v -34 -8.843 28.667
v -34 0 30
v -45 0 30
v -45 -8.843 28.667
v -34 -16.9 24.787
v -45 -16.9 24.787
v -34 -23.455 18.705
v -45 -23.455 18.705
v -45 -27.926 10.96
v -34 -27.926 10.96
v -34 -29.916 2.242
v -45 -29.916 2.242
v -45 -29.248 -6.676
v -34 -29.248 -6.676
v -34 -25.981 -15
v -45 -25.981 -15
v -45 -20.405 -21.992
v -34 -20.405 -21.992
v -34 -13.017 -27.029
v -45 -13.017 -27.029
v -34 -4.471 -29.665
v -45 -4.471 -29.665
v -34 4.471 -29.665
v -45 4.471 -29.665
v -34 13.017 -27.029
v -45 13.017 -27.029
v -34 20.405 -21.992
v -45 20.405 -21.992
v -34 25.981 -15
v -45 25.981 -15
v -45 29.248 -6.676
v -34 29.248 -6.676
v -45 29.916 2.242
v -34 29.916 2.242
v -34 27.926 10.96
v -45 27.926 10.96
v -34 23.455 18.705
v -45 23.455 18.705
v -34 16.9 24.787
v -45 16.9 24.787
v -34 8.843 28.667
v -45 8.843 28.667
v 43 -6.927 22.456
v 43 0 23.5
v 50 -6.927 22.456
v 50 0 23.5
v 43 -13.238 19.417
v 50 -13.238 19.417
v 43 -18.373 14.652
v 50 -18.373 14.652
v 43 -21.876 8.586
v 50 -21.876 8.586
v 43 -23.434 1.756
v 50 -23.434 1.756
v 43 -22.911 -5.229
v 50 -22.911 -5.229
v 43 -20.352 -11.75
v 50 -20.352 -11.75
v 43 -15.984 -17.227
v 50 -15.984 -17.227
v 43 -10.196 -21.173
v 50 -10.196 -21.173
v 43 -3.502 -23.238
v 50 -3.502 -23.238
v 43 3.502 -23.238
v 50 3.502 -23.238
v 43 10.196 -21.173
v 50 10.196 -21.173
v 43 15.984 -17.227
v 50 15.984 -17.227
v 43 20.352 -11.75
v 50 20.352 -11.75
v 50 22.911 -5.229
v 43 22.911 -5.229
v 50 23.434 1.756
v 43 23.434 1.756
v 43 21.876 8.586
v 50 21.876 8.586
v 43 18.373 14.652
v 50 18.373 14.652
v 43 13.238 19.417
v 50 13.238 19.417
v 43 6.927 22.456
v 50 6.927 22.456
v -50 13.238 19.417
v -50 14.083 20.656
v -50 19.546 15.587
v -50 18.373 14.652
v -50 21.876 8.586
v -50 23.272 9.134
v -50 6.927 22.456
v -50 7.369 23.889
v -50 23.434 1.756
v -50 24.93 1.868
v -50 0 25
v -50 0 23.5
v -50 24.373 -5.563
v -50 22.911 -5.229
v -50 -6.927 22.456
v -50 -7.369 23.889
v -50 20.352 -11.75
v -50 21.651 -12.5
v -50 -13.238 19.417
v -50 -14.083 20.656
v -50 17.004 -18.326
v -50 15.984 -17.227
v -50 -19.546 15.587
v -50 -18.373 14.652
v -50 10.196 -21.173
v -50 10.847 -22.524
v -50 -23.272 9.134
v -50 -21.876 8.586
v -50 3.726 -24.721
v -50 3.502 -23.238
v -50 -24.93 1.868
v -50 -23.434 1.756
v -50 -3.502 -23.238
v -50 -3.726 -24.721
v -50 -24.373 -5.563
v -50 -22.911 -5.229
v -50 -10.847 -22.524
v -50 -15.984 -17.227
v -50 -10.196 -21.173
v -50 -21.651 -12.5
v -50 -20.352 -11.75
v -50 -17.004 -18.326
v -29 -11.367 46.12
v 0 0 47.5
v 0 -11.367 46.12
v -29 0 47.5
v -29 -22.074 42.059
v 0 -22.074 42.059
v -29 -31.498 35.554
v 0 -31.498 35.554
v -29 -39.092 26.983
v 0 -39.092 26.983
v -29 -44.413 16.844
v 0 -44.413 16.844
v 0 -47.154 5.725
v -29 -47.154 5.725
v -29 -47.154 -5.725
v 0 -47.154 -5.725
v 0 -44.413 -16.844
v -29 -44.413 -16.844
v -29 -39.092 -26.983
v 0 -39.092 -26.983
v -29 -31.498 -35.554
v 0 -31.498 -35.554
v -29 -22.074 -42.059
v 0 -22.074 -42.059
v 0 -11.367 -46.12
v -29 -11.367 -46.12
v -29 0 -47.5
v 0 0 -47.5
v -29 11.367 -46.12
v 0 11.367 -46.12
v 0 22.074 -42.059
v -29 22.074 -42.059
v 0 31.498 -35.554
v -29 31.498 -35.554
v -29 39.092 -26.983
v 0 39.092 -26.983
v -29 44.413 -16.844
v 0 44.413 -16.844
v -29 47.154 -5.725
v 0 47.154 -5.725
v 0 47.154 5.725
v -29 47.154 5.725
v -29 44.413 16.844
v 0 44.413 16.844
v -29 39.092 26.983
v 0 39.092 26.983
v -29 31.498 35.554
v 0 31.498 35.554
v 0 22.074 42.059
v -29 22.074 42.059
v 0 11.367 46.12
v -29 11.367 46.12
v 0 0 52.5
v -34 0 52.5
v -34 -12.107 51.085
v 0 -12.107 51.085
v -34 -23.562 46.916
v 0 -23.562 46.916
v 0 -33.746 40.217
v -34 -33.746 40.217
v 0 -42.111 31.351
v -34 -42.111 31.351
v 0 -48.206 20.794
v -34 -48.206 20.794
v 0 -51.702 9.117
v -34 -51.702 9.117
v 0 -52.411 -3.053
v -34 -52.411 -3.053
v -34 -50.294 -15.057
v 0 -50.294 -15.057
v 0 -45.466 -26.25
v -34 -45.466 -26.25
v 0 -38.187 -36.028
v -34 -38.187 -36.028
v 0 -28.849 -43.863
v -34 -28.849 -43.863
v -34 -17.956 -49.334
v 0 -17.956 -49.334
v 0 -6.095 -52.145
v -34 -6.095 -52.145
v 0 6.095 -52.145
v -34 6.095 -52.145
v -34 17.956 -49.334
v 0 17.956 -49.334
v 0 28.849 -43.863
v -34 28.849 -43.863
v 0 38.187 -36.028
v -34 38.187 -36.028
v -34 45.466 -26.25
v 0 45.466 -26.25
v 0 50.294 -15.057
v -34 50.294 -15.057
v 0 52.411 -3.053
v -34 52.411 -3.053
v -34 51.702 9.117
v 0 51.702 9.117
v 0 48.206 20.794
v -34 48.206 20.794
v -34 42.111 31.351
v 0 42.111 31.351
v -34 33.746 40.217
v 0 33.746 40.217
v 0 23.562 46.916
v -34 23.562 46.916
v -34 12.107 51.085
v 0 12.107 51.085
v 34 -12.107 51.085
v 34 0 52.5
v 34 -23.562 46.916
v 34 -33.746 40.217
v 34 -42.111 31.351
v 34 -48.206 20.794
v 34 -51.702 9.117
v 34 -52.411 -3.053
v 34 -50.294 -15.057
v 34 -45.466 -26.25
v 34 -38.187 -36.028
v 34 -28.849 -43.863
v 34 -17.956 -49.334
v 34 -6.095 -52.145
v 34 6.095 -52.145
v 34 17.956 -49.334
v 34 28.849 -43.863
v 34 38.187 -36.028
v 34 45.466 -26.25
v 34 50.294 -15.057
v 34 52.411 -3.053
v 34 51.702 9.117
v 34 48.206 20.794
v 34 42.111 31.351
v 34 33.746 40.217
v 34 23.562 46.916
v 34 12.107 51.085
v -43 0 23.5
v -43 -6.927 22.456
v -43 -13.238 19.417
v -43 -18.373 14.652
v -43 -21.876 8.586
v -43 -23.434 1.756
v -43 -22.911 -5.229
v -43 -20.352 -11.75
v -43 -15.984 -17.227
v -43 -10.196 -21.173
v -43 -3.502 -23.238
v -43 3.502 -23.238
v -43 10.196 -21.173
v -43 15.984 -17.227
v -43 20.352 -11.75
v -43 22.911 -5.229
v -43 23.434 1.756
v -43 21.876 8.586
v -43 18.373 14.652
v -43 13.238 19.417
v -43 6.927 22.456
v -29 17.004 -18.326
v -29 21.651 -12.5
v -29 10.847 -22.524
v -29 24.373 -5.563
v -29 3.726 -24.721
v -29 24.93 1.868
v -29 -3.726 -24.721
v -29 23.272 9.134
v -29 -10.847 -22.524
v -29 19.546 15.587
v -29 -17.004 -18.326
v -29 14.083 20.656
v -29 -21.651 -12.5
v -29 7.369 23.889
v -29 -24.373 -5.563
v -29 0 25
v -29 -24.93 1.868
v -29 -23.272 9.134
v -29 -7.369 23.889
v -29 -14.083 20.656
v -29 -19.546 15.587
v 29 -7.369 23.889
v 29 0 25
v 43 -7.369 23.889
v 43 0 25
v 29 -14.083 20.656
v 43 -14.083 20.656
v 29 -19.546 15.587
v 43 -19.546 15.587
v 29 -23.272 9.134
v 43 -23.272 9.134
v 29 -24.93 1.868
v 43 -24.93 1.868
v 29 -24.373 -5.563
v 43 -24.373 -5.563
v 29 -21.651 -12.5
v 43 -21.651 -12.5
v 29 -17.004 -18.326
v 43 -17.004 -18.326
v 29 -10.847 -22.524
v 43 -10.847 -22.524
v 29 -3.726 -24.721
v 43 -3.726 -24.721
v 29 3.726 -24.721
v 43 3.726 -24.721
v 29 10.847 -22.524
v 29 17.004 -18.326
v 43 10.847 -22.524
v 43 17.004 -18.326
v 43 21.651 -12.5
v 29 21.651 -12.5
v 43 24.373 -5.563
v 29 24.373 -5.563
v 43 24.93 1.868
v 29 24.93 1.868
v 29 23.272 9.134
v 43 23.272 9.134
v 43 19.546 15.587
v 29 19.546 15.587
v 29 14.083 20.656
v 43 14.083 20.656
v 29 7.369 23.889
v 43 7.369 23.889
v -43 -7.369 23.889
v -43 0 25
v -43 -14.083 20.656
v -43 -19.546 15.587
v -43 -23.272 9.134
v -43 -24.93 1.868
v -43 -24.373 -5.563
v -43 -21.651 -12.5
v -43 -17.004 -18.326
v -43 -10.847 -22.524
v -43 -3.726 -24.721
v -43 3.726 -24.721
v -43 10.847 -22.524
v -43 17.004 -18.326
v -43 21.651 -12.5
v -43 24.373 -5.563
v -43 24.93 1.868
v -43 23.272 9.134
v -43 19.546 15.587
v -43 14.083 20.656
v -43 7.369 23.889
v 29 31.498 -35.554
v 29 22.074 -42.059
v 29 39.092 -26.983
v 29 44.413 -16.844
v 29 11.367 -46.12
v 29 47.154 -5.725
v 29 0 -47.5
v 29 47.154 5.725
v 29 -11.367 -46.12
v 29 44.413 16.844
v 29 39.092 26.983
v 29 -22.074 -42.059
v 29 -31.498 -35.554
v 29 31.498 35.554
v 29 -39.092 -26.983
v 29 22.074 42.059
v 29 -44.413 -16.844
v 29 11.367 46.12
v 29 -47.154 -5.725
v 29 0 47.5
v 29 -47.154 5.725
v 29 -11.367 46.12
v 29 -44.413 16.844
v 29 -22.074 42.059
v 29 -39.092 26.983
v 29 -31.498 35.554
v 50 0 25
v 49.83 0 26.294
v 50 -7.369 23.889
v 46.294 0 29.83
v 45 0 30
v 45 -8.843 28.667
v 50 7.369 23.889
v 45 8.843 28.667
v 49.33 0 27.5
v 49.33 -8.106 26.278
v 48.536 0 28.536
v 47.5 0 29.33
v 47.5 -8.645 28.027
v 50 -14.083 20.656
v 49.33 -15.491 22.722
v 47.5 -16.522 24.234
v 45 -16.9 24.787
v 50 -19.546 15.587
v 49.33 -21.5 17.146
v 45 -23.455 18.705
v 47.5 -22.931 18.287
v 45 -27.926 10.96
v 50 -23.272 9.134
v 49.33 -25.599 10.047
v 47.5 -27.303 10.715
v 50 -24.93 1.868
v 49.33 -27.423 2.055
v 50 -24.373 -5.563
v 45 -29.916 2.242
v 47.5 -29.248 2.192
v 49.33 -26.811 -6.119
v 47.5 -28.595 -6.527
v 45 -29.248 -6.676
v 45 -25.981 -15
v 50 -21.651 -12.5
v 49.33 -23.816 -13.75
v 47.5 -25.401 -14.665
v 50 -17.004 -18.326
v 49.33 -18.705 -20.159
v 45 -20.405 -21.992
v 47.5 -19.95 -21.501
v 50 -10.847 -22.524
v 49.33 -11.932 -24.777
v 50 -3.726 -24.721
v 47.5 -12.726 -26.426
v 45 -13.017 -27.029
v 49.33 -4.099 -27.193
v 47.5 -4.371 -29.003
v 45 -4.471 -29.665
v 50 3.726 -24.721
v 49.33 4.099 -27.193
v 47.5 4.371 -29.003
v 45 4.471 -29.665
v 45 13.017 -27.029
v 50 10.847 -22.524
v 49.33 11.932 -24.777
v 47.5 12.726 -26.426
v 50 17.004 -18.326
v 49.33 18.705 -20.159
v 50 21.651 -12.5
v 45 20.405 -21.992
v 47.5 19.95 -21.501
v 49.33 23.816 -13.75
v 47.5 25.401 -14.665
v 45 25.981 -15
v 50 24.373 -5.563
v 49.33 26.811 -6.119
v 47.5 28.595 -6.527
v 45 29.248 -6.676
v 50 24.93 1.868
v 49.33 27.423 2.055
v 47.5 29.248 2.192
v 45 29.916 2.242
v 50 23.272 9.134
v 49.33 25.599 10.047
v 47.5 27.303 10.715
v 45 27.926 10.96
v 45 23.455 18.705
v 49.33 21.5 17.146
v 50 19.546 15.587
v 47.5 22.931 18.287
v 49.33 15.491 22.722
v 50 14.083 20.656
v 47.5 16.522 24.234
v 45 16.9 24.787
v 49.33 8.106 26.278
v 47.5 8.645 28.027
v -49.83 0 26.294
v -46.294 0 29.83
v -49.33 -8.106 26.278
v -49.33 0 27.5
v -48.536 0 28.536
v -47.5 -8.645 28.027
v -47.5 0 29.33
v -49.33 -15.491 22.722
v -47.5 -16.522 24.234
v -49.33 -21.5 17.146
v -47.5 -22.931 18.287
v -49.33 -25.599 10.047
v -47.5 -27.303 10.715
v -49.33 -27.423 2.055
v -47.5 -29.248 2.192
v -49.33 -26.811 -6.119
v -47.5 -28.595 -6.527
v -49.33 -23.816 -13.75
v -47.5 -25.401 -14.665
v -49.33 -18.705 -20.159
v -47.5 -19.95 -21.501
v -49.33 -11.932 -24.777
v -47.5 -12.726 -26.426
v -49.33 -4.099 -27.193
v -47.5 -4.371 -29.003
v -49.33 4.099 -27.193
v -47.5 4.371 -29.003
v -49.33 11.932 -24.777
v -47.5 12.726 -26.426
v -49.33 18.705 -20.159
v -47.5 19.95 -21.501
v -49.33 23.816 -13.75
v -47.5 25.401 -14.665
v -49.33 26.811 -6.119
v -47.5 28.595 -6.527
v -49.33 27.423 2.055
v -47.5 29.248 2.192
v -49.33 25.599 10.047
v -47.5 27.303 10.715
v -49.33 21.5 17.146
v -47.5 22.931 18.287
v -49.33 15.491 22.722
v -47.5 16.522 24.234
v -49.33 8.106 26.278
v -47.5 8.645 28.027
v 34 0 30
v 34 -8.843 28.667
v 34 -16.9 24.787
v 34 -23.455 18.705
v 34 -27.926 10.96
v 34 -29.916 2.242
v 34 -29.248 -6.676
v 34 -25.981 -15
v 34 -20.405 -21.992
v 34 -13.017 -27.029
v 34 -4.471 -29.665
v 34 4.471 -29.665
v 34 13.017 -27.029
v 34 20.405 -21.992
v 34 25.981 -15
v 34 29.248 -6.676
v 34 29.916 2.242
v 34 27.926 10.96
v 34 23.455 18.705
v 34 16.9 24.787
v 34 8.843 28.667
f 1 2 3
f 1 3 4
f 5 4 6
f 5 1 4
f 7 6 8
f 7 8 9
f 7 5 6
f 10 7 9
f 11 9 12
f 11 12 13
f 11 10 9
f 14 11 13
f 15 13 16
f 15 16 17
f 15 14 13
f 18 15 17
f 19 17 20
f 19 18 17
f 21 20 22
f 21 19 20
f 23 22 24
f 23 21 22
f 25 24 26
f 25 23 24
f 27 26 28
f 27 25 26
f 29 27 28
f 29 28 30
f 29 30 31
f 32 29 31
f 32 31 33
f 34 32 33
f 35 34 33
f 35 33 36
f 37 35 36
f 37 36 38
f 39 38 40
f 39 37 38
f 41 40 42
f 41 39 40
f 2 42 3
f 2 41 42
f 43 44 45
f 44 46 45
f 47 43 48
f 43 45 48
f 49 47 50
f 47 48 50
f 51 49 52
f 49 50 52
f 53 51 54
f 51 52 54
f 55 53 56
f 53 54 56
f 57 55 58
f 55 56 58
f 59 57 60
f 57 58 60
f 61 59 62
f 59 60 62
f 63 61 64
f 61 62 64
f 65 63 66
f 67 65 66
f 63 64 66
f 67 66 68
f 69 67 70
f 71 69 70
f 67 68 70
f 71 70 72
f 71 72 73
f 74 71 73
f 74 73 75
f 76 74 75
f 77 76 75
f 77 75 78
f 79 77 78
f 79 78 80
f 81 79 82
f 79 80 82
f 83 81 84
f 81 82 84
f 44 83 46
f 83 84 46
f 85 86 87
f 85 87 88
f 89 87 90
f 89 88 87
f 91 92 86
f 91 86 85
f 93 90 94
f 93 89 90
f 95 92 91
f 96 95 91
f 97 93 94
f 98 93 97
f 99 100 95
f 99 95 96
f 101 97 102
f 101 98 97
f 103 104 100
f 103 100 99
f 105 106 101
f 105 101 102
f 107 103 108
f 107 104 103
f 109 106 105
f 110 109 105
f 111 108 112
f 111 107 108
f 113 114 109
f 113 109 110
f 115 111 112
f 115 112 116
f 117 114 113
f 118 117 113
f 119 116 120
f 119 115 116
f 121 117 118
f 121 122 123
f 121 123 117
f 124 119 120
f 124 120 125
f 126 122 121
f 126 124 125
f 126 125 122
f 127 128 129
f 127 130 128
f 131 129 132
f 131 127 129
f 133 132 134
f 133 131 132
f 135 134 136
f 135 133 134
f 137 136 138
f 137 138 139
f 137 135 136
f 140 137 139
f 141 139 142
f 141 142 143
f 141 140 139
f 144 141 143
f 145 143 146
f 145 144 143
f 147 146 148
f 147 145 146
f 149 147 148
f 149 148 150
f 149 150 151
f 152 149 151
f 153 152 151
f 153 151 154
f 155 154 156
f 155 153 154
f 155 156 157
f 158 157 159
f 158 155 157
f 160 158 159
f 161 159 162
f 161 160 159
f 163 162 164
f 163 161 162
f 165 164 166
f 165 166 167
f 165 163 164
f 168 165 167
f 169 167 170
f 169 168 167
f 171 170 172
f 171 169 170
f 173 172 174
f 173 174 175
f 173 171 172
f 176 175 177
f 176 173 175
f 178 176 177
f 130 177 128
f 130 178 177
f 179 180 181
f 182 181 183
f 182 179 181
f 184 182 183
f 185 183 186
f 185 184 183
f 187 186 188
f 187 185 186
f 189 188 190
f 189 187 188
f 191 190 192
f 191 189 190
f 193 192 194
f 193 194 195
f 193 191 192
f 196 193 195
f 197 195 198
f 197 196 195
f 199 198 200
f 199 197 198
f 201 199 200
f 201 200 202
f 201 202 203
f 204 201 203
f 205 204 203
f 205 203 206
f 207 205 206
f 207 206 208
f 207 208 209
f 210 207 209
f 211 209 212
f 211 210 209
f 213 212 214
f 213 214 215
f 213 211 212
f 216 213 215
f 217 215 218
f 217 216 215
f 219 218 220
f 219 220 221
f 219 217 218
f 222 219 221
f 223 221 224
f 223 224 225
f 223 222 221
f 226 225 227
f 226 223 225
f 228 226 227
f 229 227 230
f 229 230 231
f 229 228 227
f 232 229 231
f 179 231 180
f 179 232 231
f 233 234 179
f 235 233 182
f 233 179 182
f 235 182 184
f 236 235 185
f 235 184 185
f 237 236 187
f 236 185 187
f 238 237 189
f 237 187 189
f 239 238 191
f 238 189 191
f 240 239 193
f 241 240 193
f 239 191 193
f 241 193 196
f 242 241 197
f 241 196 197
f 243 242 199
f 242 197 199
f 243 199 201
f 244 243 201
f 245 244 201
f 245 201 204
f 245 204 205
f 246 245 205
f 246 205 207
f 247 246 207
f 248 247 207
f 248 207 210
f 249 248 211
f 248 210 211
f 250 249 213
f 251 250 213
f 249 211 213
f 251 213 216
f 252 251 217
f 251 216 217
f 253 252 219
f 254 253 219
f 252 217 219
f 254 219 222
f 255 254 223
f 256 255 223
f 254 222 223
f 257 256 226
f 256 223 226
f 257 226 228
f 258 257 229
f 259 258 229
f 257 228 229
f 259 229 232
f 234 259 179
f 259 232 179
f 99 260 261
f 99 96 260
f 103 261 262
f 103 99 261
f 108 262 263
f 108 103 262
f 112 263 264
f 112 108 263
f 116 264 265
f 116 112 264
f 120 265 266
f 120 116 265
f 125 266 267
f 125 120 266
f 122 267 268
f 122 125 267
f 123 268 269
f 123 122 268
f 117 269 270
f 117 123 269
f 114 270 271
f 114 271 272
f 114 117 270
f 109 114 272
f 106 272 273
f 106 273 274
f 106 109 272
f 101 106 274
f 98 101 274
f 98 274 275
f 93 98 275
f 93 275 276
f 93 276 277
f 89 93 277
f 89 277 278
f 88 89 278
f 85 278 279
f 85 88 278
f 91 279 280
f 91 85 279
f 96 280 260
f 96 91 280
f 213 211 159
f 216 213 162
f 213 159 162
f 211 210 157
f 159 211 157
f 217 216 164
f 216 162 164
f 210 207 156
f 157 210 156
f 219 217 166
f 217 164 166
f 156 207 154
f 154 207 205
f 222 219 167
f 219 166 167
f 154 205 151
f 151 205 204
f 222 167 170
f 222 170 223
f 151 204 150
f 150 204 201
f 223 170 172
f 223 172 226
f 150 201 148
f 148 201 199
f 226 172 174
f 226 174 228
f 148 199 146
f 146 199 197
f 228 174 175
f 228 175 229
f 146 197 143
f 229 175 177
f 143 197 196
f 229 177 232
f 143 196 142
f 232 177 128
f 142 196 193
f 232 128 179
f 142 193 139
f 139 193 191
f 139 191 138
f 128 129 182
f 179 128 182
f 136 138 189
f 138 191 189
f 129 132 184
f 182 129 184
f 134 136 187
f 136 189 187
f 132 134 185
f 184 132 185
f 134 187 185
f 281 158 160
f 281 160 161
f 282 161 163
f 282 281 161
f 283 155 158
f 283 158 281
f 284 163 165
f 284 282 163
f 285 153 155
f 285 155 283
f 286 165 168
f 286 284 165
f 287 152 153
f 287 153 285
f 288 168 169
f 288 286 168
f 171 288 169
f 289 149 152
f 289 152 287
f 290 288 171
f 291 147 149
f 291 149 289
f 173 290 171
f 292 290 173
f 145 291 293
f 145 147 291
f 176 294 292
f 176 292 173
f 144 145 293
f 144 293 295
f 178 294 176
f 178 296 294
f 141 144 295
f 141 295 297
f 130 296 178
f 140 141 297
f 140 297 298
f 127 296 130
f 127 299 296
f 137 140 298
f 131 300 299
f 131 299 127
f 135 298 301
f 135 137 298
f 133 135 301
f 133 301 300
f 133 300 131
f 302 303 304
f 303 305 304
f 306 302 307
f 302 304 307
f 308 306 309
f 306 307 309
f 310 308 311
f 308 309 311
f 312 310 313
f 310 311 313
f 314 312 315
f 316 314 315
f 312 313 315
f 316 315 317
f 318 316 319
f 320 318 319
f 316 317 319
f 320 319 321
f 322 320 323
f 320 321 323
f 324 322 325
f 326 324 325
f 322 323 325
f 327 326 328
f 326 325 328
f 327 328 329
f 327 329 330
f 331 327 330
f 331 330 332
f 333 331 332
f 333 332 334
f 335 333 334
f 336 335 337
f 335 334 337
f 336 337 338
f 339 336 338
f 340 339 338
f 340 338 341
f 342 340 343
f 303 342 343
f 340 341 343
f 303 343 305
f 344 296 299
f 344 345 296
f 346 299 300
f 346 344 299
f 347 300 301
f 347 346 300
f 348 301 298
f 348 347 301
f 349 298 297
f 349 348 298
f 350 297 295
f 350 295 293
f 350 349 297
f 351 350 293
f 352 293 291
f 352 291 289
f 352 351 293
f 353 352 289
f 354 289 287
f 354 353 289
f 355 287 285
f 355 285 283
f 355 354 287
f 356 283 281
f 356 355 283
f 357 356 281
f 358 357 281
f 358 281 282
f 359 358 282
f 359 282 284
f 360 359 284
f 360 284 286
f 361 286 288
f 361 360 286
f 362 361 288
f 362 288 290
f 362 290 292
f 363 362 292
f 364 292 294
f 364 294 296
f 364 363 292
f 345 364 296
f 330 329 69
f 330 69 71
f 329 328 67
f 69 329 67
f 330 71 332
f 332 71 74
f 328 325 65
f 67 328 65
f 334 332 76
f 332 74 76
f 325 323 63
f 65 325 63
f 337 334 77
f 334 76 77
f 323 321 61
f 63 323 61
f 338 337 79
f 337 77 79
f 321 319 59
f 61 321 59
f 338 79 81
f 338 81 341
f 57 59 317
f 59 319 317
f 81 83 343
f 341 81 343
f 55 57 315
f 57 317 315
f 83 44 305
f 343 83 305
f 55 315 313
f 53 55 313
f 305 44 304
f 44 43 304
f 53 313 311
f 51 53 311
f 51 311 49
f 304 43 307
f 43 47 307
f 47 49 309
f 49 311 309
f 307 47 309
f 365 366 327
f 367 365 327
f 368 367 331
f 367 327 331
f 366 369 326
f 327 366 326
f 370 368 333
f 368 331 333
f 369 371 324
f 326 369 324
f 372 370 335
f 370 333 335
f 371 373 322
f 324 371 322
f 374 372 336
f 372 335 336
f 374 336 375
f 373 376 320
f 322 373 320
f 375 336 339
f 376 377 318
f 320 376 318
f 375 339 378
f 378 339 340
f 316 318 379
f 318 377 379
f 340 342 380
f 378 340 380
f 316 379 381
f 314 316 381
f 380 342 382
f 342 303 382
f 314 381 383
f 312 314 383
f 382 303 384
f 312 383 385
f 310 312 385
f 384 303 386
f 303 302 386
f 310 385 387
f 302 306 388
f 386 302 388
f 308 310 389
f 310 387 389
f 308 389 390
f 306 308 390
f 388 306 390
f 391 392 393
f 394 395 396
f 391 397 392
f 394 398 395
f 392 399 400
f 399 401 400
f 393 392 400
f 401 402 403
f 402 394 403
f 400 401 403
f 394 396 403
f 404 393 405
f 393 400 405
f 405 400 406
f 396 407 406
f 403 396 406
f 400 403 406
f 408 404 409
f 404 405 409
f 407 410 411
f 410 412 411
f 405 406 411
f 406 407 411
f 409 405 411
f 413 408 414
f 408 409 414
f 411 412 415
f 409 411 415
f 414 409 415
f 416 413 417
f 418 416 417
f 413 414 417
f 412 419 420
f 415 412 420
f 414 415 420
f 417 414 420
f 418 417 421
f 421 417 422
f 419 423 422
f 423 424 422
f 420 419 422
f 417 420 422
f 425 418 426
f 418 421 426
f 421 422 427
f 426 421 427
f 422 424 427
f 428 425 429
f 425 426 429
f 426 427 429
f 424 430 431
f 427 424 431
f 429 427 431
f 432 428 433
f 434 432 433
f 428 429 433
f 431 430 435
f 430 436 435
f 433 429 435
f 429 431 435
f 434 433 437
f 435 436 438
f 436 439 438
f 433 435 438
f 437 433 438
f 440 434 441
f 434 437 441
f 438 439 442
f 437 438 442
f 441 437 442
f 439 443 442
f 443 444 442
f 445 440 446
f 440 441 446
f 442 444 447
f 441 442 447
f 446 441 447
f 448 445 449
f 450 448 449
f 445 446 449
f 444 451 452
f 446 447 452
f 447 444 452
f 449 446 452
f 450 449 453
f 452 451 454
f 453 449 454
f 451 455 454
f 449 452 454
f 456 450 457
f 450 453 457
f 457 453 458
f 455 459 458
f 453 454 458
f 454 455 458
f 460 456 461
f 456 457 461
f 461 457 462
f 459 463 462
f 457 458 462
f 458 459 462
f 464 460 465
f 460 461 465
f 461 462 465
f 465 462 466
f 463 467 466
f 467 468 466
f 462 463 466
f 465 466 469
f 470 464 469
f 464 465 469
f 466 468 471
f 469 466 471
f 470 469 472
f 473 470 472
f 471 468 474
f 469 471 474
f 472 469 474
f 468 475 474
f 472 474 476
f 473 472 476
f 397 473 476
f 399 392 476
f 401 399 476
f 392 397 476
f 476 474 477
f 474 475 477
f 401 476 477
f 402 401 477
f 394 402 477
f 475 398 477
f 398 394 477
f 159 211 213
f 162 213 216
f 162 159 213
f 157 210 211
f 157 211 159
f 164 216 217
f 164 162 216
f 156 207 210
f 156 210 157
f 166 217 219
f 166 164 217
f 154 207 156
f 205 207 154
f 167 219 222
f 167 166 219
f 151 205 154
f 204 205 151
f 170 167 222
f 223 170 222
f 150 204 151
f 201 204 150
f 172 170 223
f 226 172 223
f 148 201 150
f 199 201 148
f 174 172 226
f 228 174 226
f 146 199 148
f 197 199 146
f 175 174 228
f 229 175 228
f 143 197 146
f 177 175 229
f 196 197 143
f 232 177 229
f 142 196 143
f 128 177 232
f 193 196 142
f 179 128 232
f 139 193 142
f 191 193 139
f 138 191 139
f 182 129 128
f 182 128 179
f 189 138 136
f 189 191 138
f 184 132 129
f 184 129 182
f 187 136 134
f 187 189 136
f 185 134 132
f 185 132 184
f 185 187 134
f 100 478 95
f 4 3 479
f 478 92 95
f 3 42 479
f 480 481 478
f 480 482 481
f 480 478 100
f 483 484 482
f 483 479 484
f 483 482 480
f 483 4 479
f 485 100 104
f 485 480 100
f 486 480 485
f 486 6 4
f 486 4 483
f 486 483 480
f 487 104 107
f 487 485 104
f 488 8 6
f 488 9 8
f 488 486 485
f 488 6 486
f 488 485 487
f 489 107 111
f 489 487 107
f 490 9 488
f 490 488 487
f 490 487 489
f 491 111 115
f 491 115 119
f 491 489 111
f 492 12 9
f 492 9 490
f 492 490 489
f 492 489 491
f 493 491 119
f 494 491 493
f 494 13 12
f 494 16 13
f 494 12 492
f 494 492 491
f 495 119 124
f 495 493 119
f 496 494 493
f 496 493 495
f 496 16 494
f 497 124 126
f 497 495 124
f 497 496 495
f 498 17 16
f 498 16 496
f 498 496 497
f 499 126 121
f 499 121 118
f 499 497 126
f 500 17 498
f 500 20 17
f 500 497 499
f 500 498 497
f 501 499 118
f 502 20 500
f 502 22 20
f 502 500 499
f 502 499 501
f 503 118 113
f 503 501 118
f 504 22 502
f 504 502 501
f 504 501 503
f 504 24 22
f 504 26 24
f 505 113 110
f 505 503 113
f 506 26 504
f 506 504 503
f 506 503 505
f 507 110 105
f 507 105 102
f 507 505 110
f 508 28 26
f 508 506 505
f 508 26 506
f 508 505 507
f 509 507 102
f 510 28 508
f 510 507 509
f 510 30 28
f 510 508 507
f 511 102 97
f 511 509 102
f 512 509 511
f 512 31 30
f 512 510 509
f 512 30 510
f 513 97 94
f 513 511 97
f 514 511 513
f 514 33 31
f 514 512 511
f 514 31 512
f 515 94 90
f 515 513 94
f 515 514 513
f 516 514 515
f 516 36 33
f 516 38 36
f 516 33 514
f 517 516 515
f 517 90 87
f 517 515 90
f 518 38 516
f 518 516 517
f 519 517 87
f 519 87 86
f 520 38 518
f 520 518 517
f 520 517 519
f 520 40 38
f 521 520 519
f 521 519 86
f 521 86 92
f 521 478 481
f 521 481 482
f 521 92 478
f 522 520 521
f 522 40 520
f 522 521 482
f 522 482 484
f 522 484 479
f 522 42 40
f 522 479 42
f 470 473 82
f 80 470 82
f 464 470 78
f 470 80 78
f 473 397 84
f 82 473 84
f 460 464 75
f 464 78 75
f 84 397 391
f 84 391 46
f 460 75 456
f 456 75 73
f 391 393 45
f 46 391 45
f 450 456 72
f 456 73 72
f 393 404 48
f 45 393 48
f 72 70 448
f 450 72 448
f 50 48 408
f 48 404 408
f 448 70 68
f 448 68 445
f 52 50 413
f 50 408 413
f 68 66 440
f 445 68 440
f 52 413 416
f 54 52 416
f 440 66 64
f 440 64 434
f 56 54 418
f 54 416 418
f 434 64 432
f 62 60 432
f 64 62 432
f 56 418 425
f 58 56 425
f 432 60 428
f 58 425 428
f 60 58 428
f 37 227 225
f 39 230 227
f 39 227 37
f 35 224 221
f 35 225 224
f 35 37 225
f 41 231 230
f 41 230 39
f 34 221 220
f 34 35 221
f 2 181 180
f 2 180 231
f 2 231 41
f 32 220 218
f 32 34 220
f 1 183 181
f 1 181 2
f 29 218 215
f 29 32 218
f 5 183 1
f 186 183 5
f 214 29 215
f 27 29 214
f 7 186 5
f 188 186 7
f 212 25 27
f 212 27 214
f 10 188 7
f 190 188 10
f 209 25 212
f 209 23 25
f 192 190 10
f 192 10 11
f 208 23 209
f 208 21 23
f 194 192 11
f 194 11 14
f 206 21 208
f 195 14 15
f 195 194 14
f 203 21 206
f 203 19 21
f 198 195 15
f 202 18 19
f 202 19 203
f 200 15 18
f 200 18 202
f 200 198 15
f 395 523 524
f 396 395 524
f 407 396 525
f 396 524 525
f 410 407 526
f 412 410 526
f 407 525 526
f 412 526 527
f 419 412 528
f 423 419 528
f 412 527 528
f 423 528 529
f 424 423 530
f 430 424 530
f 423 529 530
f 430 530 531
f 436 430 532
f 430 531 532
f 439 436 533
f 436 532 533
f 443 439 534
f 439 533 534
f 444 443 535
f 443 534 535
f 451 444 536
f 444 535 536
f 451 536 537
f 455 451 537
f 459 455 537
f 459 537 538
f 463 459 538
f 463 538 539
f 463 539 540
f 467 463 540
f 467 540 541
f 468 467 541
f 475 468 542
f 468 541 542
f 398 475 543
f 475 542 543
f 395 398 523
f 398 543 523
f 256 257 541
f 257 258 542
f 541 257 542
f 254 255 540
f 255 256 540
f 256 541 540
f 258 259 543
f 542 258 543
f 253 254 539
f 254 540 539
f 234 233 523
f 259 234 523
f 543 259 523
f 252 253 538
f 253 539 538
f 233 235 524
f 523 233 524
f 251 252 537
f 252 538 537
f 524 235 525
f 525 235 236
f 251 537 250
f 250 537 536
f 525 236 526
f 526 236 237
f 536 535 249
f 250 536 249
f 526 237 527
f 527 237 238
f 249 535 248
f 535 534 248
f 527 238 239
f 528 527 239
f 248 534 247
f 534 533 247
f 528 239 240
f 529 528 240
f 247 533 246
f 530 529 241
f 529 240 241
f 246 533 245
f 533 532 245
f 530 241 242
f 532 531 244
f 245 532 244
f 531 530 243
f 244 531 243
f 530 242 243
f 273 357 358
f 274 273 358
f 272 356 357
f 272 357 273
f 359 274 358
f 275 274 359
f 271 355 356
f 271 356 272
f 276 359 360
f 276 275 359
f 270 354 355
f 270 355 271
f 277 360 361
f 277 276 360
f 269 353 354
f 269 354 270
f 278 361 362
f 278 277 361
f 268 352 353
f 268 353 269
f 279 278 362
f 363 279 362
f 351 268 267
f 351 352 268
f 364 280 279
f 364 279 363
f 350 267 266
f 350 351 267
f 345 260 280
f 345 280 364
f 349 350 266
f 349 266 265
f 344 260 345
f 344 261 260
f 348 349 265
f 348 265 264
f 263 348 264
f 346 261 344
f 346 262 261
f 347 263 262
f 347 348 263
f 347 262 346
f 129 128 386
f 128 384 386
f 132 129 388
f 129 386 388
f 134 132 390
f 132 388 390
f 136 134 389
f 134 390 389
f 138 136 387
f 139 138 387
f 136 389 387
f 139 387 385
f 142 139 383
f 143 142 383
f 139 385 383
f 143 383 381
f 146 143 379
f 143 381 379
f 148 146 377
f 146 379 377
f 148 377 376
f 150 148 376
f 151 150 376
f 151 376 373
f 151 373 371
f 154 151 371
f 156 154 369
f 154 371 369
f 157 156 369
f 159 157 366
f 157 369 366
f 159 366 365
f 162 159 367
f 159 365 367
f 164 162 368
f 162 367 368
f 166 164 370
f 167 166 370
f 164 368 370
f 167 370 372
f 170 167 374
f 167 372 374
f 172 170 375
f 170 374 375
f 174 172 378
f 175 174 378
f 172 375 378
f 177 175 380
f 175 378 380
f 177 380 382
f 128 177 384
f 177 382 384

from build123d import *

# Parameters (mm, degrees)
F2_R = 5


with BuildPart() as f1:
    # F0 (on Front) → F1 (revolve)
    with BuildSketch(Plane.XZ):
        Polygon((0, 52.5), (0, 47.5), (29, 47.5), (29, 25), (43, 25), (43, 23.5), (50, 23.5), (50, 30), (34, 30), (34, 52.5), align=None)
    revolve(axis=Axis((0.55163, 0, 0), (1, 0, 0)))

    # F2
    f2_edges = [f1.edges().sort_by_distance(p)[0] for p in [
        (50, 0, -30),
    ]]
    fillet(f2_edges, radius=F2_R)


with BuildPart() as f3_1:
    # F3: instance of F1
    add(f1.part.mirror(Plane.YZ))


solid = Compound([f1.part, f3_1.part])
